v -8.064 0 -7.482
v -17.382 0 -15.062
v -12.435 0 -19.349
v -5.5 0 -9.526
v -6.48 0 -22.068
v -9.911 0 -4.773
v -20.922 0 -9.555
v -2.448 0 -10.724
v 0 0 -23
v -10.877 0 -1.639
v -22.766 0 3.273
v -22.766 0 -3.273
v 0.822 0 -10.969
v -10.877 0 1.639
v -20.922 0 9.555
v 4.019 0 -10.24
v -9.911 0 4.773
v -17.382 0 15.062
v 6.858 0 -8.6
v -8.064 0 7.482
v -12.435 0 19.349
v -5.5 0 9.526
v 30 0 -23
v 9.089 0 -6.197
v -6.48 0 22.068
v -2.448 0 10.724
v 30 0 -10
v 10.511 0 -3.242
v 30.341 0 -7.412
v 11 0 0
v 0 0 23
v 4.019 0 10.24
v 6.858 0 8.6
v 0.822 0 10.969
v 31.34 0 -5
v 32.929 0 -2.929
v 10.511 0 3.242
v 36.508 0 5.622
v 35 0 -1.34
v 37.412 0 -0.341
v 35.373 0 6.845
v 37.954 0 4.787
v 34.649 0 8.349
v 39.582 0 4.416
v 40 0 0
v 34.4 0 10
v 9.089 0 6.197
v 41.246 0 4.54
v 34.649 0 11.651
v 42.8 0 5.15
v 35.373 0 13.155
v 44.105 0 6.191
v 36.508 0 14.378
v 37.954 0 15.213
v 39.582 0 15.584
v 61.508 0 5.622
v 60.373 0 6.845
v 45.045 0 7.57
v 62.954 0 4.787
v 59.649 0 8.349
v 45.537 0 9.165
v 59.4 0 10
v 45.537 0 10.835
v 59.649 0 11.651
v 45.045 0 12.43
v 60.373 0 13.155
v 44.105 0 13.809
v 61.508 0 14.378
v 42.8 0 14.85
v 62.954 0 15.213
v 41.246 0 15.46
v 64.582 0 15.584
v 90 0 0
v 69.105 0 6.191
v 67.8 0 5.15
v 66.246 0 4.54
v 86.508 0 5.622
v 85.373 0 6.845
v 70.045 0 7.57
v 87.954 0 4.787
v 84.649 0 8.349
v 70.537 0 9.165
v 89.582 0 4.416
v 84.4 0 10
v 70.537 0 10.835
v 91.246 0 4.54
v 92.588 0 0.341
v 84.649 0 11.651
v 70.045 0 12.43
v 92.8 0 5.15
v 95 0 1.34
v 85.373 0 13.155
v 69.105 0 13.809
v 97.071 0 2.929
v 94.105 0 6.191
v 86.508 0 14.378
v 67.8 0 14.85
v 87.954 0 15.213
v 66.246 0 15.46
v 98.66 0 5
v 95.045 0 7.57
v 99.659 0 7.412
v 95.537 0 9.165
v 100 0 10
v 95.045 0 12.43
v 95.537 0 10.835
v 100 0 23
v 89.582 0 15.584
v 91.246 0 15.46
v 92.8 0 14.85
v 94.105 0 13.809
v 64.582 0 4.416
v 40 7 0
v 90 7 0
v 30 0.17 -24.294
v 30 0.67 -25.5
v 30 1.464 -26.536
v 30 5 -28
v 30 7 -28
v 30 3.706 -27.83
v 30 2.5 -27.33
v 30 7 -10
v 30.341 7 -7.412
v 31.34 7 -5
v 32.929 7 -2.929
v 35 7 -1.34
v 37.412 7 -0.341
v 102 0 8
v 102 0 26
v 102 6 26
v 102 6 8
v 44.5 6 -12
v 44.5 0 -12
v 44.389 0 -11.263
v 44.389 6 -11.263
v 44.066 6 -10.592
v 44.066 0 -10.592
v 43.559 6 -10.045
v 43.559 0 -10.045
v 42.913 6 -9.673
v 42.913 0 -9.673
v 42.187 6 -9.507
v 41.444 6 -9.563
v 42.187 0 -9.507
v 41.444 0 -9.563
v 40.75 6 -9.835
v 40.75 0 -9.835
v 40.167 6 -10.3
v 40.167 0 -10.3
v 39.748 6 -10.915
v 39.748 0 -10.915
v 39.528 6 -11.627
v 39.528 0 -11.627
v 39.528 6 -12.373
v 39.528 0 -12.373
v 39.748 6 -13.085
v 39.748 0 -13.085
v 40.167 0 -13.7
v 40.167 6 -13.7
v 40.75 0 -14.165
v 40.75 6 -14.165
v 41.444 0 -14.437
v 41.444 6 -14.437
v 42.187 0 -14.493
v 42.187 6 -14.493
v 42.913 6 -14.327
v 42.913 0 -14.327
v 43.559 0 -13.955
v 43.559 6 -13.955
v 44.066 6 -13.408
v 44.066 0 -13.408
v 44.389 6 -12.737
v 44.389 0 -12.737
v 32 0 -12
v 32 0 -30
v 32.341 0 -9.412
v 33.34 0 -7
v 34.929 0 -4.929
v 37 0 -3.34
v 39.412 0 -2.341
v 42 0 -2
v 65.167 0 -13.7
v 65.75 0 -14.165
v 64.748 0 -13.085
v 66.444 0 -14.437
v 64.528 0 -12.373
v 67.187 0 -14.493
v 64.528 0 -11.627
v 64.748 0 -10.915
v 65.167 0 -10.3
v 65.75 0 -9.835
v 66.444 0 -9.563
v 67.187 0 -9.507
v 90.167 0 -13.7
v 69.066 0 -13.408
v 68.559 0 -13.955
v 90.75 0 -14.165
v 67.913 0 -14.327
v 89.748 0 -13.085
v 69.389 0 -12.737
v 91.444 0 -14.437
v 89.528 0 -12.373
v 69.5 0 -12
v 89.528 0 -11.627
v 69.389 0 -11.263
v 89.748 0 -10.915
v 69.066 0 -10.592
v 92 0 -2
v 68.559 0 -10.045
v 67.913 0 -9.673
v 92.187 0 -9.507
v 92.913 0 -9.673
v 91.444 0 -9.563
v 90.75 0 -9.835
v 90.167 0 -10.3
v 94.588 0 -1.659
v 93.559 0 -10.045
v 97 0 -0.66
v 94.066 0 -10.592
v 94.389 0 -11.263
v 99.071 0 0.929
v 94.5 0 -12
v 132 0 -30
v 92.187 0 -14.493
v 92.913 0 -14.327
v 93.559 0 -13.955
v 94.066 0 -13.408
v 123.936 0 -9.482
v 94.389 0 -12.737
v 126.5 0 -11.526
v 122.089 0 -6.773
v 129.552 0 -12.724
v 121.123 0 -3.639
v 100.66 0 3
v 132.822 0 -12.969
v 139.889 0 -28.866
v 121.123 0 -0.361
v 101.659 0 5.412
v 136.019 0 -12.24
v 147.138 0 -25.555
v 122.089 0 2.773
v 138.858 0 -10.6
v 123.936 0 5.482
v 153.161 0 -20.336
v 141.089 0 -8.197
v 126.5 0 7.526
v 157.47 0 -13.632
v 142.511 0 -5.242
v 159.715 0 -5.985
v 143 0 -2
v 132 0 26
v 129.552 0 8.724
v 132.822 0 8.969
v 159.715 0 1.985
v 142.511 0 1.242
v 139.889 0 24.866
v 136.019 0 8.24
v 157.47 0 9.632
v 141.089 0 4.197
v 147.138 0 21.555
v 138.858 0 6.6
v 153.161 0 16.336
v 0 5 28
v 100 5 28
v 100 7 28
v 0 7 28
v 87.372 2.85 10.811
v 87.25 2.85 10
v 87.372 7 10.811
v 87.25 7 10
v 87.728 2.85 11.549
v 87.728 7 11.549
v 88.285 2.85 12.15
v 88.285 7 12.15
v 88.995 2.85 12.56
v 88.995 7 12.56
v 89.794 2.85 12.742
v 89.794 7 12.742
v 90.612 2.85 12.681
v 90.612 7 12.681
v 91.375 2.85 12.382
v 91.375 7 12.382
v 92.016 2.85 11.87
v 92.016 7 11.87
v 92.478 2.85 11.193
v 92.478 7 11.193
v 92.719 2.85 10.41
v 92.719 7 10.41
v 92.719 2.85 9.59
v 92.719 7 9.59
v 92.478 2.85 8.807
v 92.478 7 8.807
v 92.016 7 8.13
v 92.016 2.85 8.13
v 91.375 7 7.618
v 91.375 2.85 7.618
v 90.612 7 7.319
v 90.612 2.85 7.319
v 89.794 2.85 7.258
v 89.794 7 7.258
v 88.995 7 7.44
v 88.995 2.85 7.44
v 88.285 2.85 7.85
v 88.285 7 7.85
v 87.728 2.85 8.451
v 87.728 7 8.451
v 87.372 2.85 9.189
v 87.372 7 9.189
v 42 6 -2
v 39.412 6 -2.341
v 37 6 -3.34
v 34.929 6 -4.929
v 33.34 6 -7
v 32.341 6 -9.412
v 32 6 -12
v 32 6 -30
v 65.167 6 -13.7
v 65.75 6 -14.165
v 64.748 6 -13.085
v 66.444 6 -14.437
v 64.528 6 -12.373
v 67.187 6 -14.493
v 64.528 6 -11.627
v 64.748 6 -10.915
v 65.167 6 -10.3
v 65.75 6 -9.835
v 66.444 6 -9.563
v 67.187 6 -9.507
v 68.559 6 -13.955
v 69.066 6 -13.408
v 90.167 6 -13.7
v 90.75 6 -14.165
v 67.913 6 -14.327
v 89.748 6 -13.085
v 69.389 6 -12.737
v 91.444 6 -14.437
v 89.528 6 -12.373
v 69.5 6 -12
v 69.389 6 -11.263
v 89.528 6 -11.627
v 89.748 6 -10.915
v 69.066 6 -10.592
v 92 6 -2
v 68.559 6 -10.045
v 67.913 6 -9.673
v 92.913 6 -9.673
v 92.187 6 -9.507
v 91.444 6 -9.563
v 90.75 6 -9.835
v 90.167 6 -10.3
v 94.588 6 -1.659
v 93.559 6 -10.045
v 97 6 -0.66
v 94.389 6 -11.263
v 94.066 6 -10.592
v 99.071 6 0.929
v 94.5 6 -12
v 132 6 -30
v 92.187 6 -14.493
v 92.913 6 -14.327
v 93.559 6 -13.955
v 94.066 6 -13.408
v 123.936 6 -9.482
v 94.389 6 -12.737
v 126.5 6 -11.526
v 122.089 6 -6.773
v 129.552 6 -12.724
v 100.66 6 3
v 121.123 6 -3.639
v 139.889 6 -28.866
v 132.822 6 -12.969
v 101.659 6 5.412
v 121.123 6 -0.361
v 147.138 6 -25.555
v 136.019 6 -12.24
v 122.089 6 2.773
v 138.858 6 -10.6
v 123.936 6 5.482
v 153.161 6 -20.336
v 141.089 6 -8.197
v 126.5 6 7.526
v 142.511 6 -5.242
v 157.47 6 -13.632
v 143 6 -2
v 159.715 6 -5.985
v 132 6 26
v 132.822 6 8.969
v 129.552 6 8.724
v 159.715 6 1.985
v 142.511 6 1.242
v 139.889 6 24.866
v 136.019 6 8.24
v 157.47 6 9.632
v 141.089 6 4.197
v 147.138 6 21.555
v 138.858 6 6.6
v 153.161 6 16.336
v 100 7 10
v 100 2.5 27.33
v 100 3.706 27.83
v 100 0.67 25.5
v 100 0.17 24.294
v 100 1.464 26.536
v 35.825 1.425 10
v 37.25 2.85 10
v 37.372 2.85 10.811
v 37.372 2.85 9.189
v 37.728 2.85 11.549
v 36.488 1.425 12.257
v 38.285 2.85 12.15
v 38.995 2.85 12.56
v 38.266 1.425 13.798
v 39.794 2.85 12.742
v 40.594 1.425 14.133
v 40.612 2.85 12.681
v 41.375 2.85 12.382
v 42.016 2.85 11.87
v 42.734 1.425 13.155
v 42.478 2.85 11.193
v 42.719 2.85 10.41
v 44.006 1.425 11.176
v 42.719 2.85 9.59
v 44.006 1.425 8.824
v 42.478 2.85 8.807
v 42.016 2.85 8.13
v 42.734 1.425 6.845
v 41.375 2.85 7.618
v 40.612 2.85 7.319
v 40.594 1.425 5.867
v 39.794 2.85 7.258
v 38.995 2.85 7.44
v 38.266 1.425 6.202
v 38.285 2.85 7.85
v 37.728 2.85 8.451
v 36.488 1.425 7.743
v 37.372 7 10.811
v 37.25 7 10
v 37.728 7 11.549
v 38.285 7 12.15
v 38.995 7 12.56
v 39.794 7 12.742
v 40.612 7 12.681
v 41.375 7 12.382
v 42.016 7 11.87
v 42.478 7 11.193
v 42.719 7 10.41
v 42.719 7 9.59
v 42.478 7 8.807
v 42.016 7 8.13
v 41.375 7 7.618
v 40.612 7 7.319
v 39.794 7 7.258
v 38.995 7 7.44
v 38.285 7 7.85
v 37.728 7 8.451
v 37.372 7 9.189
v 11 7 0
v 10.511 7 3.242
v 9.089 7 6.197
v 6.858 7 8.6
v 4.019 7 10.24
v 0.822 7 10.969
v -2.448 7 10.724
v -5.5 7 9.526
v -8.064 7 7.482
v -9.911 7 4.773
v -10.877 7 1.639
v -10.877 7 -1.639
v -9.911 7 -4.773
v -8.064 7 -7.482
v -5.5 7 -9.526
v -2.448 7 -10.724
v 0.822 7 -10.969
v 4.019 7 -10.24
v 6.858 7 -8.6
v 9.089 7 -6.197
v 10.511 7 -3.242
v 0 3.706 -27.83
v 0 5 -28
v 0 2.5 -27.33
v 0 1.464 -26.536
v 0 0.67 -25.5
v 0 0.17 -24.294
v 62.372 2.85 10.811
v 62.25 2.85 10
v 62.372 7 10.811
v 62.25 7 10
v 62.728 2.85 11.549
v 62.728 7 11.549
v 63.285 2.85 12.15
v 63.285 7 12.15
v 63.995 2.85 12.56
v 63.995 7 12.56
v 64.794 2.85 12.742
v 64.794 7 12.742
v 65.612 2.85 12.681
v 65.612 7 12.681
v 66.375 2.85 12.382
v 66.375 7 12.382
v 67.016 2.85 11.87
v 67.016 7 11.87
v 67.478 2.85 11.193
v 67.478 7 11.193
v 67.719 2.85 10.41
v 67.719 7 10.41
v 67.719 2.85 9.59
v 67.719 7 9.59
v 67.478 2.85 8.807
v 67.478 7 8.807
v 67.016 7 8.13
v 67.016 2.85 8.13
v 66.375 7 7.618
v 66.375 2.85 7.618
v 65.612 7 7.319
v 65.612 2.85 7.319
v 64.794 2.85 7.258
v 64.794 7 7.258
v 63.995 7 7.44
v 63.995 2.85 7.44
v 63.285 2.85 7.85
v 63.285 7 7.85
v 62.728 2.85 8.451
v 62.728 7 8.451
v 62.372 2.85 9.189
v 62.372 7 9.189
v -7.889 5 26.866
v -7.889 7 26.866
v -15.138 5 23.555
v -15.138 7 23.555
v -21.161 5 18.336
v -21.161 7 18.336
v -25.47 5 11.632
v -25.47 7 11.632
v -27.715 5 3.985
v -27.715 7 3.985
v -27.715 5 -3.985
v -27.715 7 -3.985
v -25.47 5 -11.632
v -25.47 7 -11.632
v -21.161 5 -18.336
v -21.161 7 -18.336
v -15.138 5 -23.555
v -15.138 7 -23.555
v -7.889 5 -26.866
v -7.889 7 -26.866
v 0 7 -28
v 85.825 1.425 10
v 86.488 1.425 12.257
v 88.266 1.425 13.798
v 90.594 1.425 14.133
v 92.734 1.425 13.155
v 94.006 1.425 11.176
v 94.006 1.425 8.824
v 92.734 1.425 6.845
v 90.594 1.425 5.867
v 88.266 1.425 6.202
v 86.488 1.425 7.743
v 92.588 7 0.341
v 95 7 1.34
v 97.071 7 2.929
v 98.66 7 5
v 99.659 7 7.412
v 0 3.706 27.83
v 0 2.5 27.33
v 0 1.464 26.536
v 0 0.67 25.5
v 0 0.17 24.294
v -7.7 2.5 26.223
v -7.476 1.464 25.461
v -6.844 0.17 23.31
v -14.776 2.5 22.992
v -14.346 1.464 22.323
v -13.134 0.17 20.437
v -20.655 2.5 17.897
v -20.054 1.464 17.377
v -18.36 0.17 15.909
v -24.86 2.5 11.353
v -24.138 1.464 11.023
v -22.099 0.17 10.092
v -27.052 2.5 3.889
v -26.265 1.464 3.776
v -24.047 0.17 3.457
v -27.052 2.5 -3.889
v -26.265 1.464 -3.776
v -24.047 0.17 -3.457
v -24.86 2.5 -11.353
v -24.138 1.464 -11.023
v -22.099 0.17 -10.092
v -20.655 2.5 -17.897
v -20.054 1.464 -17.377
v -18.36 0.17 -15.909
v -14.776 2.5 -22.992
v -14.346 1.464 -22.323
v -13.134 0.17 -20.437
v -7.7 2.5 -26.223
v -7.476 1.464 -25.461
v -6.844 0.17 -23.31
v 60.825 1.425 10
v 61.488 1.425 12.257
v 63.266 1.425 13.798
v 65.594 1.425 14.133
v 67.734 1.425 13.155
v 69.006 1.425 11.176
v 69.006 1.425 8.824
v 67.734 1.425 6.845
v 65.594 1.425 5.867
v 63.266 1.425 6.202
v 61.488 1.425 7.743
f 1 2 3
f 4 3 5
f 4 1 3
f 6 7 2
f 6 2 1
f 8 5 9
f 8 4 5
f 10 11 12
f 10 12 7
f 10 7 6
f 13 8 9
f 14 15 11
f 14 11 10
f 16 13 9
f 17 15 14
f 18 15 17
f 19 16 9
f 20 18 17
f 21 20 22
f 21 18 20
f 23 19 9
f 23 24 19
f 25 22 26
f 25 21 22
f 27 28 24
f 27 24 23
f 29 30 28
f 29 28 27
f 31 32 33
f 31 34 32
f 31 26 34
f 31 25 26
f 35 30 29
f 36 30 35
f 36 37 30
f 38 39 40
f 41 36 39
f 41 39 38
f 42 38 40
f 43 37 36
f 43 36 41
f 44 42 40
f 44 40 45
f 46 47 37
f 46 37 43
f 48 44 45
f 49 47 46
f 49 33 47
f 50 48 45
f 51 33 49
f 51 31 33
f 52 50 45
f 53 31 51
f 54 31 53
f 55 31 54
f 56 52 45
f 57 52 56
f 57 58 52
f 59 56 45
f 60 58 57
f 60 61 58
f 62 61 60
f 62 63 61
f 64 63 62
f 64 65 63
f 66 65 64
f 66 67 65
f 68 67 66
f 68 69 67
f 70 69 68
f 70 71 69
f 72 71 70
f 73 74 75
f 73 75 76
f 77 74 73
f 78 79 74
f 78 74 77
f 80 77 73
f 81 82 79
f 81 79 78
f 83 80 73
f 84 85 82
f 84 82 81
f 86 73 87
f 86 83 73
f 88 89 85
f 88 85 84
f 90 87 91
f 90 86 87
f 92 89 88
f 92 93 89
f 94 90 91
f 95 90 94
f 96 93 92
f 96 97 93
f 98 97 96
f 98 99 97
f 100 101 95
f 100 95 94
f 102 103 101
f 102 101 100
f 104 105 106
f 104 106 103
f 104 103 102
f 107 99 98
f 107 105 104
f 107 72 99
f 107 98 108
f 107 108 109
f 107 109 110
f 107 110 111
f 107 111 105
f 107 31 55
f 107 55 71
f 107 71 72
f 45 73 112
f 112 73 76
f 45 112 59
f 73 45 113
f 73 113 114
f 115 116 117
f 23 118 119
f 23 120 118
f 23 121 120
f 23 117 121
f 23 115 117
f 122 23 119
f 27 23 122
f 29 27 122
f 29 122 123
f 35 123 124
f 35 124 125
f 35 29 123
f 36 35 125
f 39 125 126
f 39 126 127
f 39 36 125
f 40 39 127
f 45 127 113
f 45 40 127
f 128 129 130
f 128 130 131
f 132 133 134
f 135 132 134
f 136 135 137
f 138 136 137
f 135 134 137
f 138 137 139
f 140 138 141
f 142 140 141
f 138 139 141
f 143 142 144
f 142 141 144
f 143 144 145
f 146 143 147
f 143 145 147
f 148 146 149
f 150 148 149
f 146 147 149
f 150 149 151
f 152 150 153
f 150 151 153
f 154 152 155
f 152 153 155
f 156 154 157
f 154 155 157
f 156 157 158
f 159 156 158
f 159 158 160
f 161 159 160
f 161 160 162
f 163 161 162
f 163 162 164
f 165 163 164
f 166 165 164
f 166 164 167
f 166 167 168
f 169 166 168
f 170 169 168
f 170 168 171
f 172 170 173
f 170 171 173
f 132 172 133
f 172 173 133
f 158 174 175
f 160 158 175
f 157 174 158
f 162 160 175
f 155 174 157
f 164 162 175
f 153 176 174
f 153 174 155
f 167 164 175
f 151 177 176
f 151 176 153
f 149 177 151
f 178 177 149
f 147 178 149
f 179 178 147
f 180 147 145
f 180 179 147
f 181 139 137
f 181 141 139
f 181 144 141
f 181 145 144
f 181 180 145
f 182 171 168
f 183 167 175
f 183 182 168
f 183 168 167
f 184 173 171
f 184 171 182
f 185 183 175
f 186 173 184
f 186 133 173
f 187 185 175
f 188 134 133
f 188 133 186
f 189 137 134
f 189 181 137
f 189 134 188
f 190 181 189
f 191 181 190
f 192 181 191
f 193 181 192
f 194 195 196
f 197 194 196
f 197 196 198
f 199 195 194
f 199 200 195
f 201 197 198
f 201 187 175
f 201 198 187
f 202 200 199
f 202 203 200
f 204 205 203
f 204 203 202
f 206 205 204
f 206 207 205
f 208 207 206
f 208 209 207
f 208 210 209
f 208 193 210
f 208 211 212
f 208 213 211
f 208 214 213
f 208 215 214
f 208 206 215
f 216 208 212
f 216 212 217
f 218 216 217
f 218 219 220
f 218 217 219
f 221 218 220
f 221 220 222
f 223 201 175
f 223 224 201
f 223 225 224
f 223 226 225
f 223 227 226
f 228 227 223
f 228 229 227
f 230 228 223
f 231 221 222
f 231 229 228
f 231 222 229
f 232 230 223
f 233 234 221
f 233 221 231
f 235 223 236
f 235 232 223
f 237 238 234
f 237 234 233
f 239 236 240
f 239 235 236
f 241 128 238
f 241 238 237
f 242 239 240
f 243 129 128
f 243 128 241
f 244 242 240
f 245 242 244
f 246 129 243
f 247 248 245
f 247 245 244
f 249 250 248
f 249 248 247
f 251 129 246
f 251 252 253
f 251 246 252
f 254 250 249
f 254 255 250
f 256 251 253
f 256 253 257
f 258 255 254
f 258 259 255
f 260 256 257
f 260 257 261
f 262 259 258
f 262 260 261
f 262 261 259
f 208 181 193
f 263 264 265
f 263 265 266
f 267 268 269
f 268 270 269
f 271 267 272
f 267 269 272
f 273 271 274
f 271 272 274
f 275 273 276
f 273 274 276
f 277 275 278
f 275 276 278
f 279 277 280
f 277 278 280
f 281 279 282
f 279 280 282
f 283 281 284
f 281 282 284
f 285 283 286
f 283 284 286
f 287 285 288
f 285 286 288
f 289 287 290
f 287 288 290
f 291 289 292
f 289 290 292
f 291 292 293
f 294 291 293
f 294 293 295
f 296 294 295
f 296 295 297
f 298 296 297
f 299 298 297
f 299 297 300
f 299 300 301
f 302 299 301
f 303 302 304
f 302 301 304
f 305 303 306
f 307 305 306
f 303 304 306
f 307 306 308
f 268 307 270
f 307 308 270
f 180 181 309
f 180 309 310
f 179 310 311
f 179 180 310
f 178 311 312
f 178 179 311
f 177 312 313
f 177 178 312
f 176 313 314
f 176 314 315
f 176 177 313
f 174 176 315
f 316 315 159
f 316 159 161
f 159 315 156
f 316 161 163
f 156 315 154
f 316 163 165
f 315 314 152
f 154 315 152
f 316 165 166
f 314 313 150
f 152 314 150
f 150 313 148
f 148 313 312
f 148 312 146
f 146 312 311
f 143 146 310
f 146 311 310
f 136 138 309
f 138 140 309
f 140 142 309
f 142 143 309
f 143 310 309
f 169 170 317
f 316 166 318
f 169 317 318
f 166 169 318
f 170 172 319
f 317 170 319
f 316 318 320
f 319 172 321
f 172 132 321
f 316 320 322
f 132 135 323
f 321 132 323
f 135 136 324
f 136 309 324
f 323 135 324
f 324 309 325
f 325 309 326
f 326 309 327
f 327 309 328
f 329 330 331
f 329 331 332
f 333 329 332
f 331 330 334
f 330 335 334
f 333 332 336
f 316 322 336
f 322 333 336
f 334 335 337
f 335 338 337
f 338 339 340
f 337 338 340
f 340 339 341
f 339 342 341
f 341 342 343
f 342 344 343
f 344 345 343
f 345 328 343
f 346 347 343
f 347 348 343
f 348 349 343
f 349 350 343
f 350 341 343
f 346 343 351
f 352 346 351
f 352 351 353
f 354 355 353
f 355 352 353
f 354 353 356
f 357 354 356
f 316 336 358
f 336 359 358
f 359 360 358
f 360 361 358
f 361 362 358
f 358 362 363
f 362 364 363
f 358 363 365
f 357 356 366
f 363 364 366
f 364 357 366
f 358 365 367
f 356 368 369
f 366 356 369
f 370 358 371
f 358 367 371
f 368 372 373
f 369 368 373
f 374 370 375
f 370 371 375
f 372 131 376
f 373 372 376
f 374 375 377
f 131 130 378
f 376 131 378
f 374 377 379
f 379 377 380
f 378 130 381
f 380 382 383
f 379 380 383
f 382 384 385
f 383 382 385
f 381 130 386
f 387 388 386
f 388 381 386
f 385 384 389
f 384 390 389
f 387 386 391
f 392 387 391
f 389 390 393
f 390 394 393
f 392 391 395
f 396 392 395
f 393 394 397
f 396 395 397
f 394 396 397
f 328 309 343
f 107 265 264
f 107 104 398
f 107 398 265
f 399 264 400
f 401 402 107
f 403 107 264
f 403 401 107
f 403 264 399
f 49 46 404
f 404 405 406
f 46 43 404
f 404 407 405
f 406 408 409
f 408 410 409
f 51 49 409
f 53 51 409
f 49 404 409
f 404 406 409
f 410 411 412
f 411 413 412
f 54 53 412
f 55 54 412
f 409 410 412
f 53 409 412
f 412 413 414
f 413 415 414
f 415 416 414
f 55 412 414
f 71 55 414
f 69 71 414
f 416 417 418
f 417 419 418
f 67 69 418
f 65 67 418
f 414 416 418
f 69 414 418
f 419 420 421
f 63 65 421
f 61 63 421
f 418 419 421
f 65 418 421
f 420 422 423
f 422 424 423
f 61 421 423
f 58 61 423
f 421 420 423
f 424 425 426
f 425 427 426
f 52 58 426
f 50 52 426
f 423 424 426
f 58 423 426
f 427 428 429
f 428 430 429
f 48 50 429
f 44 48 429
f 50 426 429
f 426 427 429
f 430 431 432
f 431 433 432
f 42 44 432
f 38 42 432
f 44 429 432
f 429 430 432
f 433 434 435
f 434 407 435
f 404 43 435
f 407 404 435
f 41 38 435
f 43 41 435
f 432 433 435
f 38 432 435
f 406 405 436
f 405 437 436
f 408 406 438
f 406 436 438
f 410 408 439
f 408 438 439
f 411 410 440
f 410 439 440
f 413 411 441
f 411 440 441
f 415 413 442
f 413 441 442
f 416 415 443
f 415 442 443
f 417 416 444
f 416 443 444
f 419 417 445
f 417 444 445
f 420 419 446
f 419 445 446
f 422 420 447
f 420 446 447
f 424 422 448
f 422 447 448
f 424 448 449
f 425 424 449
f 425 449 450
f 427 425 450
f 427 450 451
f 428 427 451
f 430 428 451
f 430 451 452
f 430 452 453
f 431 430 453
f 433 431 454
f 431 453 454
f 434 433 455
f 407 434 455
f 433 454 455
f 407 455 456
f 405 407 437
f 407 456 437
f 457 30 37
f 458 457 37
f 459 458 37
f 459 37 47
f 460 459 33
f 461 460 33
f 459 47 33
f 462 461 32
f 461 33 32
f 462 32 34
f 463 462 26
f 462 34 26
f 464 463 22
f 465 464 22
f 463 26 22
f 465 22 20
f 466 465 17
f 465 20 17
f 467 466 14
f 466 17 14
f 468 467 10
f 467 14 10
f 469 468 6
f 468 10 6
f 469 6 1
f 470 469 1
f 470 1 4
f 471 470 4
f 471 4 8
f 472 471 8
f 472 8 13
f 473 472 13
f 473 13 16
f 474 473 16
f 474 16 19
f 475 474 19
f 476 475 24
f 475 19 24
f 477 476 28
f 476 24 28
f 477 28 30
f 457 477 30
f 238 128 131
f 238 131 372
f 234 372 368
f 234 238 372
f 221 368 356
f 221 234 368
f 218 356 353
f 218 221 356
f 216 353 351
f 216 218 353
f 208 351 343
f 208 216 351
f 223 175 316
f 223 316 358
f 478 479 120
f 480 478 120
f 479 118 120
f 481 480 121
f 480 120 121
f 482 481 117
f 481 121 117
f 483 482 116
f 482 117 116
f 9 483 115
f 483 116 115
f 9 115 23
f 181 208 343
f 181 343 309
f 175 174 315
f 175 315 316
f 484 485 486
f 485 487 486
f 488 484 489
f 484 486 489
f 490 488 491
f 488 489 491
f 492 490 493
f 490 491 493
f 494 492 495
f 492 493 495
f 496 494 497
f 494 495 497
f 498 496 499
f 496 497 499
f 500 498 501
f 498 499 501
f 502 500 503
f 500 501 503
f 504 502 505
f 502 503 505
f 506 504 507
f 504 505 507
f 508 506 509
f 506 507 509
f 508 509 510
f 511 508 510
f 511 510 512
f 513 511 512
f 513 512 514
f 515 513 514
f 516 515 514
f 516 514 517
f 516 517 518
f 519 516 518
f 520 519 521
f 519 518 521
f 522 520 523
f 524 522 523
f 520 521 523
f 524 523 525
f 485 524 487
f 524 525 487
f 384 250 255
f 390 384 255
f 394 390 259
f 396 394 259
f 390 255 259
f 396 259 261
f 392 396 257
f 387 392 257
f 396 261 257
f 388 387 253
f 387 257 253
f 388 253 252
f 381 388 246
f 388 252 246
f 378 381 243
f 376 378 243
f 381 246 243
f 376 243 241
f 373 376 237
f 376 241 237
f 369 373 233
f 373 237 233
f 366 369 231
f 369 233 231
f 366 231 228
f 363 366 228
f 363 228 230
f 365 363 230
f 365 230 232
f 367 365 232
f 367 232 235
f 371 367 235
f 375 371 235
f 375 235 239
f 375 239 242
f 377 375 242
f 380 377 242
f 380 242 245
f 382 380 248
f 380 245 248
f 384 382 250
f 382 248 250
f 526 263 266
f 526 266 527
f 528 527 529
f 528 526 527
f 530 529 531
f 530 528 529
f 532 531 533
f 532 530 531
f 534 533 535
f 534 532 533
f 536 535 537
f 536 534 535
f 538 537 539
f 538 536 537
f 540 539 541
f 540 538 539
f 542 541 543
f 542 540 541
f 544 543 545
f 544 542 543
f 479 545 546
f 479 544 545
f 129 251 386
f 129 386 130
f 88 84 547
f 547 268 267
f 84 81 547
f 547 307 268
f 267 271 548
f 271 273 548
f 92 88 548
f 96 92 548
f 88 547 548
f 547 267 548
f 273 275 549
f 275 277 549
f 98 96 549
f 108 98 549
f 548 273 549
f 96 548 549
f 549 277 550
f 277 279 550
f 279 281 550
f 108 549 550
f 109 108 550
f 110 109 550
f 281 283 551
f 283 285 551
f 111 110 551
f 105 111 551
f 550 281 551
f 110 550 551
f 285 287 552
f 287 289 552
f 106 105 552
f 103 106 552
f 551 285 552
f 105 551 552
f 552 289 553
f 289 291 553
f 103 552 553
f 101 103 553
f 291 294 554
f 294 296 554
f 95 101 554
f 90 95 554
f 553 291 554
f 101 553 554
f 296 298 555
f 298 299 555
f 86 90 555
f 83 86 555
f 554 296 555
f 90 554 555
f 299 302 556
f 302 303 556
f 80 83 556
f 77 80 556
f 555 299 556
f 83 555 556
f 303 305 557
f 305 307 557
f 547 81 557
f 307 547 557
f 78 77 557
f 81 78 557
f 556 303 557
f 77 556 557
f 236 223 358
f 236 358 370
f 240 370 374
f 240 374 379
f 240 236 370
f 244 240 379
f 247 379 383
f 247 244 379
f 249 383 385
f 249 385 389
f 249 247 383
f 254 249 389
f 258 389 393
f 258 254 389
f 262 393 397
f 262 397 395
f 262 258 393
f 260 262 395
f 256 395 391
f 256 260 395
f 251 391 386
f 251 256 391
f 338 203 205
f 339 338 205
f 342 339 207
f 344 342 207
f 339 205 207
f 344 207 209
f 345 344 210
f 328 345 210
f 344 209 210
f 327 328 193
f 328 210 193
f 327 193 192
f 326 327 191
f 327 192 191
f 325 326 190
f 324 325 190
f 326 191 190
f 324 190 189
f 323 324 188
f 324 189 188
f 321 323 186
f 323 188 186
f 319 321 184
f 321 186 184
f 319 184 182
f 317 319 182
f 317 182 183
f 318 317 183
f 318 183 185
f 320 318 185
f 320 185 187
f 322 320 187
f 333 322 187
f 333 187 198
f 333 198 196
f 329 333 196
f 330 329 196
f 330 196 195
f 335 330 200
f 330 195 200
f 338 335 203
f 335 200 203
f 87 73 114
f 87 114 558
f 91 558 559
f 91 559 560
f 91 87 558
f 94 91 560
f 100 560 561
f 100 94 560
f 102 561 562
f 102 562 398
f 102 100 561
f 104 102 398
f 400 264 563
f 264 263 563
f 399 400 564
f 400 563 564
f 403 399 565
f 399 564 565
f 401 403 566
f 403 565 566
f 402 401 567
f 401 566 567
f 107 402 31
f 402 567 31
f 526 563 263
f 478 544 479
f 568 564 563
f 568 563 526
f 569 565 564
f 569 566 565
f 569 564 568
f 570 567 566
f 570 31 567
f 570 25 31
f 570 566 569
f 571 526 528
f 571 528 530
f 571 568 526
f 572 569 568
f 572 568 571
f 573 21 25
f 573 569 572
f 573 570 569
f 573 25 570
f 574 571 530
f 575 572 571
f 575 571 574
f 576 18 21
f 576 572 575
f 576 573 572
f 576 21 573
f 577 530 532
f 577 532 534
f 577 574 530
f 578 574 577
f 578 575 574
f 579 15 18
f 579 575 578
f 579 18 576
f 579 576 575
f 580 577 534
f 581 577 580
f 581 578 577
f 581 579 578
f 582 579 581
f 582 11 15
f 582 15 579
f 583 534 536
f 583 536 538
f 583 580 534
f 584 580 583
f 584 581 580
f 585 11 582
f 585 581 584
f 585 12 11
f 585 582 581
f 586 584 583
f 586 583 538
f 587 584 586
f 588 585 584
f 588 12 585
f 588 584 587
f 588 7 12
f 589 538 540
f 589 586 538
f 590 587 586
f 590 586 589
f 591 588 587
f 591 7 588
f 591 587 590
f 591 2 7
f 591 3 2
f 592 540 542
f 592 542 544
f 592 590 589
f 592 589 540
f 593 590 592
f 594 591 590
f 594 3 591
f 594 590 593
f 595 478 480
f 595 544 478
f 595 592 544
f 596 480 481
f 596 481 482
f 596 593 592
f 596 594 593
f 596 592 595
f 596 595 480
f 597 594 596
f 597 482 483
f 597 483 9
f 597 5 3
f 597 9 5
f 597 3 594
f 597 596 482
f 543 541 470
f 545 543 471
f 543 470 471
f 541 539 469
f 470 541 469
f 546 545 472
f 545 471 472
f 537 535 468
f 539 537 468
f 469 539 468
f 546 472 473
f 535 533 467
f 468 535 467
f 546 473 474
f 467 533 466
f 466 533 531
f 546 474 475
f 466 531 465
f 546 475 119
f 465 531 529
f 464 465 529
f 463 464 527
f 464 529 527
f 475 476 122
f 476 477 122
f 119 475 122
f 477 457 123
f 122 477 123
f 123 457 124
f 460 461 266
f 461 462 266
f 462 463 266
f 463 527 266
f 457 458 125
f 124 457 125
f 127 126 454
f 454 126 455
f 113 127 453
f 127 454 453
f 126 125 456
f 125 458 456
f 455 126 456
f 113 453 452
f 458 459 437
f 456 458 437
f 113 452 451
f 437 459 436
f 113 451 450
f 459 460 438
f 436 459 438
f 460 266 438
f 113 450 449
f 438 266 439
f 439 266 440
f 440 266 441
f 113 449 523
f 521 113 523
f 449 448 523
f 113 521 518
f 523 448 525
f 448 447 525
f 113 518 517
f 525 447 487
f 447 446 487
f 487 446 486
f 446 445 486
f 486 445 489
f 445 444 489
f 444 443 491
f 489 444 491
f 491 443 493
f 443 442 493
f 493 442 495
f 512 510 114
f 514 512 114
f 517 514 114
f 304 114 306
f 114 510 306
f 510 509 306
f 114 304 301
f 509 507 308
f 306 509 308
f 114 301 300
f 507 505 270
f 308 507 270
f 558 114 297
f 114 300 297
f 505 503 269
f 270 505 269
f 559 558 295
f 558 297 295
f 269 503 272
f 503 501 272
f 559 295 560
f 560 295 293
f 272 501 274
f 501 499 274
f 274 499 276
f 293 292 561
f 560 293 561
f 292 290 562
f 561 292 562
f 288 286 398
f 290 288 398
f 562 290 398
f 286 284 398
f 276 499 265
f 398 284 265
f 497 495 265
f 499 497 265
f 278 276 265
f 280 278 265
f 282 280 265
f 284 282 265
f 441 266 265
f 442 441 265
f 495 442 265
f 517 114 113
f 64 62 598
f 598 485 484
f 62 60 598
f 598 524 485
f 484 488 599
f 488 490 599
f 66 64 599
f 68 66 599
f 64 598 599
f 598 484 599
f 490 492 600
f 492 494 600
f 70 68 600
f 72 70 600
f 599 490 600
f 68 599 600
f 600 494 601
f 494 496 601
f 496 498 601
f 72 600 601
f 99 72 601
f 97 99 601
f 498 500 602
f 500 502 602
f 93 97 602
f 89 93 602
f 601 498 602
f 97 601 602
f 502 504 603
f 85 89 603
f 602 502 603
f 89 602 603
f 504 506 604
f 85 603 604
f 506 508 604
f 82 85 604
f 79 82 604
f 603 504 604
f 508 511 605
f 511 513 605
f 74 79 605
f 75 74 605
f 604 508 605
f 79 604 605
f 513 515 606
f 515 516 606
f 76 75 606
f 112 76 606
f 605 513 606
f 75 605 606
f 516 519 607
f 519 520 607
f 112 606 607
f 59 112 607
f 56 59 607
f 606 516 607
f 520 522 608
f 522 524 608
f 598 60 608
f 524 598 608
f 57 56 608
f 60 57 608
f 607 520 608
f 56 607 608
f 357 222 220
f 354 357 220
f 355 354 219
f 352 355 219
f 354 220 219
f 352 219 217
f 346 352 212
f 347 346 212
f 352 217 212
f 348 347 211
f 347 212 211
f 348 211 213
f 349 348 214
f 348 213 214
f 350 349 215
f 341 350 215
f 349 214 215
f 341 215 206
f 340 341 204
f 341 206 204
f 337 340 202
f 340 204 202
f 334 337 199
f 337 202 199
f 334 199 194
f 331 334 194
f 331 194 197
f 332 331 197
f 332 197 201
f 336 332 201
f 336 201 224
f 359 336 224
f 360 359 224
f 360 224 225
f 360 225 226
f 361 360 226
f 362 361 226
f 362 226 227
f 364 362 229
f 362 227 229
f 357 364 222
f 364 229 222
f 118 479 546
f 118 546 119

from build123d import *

# Parameters (mm, degrees)
F0_R           = 11
F0_R_2         = 2.5
F1_DEPTH       = 7
F2_R           = 5
F3_D           = 5.5
F3_CSINK_D     = 11.2
F3_CSINK_ANGLE = 90
F4_DEPTH       = 6


with BuildPart() as f1:
    # F0 (on Front) → F1 (new body)
    with BuildSketch(Plane.XZ):
        with BuildLine():
            Line((100, 28), (0, 28))
            ThreePointArc((0, 28), (-28, 0), (0, -28))
            Line((0, -28), (30, -28))
            Line((30, -28), (30, -10))
            ThreePointArc((30, -10), (32.9289321881, -2.9289321881), (40, 0))
            Line((40, 0), (90, 0))
            ThreePointArc((90, 0), (97.0710678119, 2.9289321881), (100, 10))
            Line((100, 10), (100, 28))
        make_face()
        Circle(F0_R, mode=Mode.SUBTRACT)
        with Locations((40, 10)):
            Circle(F0_R_2, mode=Mode.SUBTRACT)
        with Locations((65, 10)):
            Circle(F0_R_2, mode=Mode.SUBTRACT)
        with Locations((90, 10)):
            Circle(F0_R_2, mode=Mode.SUBTRACT)
    extrude(amount=-F1_DEPTH)

    # F2
    f2_edges = [f1.edges().sort_by_distance(p)[0] for p in [
        (50, 0, 28),
    ]]
    fillet(f2_edges, radius=F2_R)

    # F3 (through all)
    with Locations(Plane.XZ):
        with Locations((90, 10), (65, 10), (40, 10)):
            CounterSinkHole(F3_D / 2, F3_CSINK_D / 2, counter_sink_angle=F3_CSINK_ANGLE)


with BuildPart() as f4:
    # F0 (on Front) → F4 (new body)
    with BuildSketch(Plane.XZ):
        with BuildLine():
            Line((32, -30), (132, -30))
            ThreePointArc((132, -30), (160, -2), (132, 26))
            Line((132, 26), (102, 26))
            Line((102, 26), (102, 8))
            ThreePointArc((102, 8), (99.0710678119, 0.9289321881), (92, -2))
            Line((92, -2), (42, -2))
            ThreePointArc((42, -2), (34.9289321881, -4.9289321881), (32, -12))
            Line((32, -12), (32, -30))
        make_face()
        with Locations((42, -12)):
            Circle(F0_R_2, mode=Mode.SUBTRACT)
        with Locations((67, -12)):
            Circle(F0_R_2, mode=Mode.SUBTRACT)
        with Locations((92, -12)):
            Circle(F0_R_2, mode=Mode.SUBTRACT)
        with Locations((132, -2)):
            Circle(F0_R, mode=Mode.SUBTRACT)
    extrude(amount=-F4_DEPTH)


solid = Compound([f1.part, f4.part])
